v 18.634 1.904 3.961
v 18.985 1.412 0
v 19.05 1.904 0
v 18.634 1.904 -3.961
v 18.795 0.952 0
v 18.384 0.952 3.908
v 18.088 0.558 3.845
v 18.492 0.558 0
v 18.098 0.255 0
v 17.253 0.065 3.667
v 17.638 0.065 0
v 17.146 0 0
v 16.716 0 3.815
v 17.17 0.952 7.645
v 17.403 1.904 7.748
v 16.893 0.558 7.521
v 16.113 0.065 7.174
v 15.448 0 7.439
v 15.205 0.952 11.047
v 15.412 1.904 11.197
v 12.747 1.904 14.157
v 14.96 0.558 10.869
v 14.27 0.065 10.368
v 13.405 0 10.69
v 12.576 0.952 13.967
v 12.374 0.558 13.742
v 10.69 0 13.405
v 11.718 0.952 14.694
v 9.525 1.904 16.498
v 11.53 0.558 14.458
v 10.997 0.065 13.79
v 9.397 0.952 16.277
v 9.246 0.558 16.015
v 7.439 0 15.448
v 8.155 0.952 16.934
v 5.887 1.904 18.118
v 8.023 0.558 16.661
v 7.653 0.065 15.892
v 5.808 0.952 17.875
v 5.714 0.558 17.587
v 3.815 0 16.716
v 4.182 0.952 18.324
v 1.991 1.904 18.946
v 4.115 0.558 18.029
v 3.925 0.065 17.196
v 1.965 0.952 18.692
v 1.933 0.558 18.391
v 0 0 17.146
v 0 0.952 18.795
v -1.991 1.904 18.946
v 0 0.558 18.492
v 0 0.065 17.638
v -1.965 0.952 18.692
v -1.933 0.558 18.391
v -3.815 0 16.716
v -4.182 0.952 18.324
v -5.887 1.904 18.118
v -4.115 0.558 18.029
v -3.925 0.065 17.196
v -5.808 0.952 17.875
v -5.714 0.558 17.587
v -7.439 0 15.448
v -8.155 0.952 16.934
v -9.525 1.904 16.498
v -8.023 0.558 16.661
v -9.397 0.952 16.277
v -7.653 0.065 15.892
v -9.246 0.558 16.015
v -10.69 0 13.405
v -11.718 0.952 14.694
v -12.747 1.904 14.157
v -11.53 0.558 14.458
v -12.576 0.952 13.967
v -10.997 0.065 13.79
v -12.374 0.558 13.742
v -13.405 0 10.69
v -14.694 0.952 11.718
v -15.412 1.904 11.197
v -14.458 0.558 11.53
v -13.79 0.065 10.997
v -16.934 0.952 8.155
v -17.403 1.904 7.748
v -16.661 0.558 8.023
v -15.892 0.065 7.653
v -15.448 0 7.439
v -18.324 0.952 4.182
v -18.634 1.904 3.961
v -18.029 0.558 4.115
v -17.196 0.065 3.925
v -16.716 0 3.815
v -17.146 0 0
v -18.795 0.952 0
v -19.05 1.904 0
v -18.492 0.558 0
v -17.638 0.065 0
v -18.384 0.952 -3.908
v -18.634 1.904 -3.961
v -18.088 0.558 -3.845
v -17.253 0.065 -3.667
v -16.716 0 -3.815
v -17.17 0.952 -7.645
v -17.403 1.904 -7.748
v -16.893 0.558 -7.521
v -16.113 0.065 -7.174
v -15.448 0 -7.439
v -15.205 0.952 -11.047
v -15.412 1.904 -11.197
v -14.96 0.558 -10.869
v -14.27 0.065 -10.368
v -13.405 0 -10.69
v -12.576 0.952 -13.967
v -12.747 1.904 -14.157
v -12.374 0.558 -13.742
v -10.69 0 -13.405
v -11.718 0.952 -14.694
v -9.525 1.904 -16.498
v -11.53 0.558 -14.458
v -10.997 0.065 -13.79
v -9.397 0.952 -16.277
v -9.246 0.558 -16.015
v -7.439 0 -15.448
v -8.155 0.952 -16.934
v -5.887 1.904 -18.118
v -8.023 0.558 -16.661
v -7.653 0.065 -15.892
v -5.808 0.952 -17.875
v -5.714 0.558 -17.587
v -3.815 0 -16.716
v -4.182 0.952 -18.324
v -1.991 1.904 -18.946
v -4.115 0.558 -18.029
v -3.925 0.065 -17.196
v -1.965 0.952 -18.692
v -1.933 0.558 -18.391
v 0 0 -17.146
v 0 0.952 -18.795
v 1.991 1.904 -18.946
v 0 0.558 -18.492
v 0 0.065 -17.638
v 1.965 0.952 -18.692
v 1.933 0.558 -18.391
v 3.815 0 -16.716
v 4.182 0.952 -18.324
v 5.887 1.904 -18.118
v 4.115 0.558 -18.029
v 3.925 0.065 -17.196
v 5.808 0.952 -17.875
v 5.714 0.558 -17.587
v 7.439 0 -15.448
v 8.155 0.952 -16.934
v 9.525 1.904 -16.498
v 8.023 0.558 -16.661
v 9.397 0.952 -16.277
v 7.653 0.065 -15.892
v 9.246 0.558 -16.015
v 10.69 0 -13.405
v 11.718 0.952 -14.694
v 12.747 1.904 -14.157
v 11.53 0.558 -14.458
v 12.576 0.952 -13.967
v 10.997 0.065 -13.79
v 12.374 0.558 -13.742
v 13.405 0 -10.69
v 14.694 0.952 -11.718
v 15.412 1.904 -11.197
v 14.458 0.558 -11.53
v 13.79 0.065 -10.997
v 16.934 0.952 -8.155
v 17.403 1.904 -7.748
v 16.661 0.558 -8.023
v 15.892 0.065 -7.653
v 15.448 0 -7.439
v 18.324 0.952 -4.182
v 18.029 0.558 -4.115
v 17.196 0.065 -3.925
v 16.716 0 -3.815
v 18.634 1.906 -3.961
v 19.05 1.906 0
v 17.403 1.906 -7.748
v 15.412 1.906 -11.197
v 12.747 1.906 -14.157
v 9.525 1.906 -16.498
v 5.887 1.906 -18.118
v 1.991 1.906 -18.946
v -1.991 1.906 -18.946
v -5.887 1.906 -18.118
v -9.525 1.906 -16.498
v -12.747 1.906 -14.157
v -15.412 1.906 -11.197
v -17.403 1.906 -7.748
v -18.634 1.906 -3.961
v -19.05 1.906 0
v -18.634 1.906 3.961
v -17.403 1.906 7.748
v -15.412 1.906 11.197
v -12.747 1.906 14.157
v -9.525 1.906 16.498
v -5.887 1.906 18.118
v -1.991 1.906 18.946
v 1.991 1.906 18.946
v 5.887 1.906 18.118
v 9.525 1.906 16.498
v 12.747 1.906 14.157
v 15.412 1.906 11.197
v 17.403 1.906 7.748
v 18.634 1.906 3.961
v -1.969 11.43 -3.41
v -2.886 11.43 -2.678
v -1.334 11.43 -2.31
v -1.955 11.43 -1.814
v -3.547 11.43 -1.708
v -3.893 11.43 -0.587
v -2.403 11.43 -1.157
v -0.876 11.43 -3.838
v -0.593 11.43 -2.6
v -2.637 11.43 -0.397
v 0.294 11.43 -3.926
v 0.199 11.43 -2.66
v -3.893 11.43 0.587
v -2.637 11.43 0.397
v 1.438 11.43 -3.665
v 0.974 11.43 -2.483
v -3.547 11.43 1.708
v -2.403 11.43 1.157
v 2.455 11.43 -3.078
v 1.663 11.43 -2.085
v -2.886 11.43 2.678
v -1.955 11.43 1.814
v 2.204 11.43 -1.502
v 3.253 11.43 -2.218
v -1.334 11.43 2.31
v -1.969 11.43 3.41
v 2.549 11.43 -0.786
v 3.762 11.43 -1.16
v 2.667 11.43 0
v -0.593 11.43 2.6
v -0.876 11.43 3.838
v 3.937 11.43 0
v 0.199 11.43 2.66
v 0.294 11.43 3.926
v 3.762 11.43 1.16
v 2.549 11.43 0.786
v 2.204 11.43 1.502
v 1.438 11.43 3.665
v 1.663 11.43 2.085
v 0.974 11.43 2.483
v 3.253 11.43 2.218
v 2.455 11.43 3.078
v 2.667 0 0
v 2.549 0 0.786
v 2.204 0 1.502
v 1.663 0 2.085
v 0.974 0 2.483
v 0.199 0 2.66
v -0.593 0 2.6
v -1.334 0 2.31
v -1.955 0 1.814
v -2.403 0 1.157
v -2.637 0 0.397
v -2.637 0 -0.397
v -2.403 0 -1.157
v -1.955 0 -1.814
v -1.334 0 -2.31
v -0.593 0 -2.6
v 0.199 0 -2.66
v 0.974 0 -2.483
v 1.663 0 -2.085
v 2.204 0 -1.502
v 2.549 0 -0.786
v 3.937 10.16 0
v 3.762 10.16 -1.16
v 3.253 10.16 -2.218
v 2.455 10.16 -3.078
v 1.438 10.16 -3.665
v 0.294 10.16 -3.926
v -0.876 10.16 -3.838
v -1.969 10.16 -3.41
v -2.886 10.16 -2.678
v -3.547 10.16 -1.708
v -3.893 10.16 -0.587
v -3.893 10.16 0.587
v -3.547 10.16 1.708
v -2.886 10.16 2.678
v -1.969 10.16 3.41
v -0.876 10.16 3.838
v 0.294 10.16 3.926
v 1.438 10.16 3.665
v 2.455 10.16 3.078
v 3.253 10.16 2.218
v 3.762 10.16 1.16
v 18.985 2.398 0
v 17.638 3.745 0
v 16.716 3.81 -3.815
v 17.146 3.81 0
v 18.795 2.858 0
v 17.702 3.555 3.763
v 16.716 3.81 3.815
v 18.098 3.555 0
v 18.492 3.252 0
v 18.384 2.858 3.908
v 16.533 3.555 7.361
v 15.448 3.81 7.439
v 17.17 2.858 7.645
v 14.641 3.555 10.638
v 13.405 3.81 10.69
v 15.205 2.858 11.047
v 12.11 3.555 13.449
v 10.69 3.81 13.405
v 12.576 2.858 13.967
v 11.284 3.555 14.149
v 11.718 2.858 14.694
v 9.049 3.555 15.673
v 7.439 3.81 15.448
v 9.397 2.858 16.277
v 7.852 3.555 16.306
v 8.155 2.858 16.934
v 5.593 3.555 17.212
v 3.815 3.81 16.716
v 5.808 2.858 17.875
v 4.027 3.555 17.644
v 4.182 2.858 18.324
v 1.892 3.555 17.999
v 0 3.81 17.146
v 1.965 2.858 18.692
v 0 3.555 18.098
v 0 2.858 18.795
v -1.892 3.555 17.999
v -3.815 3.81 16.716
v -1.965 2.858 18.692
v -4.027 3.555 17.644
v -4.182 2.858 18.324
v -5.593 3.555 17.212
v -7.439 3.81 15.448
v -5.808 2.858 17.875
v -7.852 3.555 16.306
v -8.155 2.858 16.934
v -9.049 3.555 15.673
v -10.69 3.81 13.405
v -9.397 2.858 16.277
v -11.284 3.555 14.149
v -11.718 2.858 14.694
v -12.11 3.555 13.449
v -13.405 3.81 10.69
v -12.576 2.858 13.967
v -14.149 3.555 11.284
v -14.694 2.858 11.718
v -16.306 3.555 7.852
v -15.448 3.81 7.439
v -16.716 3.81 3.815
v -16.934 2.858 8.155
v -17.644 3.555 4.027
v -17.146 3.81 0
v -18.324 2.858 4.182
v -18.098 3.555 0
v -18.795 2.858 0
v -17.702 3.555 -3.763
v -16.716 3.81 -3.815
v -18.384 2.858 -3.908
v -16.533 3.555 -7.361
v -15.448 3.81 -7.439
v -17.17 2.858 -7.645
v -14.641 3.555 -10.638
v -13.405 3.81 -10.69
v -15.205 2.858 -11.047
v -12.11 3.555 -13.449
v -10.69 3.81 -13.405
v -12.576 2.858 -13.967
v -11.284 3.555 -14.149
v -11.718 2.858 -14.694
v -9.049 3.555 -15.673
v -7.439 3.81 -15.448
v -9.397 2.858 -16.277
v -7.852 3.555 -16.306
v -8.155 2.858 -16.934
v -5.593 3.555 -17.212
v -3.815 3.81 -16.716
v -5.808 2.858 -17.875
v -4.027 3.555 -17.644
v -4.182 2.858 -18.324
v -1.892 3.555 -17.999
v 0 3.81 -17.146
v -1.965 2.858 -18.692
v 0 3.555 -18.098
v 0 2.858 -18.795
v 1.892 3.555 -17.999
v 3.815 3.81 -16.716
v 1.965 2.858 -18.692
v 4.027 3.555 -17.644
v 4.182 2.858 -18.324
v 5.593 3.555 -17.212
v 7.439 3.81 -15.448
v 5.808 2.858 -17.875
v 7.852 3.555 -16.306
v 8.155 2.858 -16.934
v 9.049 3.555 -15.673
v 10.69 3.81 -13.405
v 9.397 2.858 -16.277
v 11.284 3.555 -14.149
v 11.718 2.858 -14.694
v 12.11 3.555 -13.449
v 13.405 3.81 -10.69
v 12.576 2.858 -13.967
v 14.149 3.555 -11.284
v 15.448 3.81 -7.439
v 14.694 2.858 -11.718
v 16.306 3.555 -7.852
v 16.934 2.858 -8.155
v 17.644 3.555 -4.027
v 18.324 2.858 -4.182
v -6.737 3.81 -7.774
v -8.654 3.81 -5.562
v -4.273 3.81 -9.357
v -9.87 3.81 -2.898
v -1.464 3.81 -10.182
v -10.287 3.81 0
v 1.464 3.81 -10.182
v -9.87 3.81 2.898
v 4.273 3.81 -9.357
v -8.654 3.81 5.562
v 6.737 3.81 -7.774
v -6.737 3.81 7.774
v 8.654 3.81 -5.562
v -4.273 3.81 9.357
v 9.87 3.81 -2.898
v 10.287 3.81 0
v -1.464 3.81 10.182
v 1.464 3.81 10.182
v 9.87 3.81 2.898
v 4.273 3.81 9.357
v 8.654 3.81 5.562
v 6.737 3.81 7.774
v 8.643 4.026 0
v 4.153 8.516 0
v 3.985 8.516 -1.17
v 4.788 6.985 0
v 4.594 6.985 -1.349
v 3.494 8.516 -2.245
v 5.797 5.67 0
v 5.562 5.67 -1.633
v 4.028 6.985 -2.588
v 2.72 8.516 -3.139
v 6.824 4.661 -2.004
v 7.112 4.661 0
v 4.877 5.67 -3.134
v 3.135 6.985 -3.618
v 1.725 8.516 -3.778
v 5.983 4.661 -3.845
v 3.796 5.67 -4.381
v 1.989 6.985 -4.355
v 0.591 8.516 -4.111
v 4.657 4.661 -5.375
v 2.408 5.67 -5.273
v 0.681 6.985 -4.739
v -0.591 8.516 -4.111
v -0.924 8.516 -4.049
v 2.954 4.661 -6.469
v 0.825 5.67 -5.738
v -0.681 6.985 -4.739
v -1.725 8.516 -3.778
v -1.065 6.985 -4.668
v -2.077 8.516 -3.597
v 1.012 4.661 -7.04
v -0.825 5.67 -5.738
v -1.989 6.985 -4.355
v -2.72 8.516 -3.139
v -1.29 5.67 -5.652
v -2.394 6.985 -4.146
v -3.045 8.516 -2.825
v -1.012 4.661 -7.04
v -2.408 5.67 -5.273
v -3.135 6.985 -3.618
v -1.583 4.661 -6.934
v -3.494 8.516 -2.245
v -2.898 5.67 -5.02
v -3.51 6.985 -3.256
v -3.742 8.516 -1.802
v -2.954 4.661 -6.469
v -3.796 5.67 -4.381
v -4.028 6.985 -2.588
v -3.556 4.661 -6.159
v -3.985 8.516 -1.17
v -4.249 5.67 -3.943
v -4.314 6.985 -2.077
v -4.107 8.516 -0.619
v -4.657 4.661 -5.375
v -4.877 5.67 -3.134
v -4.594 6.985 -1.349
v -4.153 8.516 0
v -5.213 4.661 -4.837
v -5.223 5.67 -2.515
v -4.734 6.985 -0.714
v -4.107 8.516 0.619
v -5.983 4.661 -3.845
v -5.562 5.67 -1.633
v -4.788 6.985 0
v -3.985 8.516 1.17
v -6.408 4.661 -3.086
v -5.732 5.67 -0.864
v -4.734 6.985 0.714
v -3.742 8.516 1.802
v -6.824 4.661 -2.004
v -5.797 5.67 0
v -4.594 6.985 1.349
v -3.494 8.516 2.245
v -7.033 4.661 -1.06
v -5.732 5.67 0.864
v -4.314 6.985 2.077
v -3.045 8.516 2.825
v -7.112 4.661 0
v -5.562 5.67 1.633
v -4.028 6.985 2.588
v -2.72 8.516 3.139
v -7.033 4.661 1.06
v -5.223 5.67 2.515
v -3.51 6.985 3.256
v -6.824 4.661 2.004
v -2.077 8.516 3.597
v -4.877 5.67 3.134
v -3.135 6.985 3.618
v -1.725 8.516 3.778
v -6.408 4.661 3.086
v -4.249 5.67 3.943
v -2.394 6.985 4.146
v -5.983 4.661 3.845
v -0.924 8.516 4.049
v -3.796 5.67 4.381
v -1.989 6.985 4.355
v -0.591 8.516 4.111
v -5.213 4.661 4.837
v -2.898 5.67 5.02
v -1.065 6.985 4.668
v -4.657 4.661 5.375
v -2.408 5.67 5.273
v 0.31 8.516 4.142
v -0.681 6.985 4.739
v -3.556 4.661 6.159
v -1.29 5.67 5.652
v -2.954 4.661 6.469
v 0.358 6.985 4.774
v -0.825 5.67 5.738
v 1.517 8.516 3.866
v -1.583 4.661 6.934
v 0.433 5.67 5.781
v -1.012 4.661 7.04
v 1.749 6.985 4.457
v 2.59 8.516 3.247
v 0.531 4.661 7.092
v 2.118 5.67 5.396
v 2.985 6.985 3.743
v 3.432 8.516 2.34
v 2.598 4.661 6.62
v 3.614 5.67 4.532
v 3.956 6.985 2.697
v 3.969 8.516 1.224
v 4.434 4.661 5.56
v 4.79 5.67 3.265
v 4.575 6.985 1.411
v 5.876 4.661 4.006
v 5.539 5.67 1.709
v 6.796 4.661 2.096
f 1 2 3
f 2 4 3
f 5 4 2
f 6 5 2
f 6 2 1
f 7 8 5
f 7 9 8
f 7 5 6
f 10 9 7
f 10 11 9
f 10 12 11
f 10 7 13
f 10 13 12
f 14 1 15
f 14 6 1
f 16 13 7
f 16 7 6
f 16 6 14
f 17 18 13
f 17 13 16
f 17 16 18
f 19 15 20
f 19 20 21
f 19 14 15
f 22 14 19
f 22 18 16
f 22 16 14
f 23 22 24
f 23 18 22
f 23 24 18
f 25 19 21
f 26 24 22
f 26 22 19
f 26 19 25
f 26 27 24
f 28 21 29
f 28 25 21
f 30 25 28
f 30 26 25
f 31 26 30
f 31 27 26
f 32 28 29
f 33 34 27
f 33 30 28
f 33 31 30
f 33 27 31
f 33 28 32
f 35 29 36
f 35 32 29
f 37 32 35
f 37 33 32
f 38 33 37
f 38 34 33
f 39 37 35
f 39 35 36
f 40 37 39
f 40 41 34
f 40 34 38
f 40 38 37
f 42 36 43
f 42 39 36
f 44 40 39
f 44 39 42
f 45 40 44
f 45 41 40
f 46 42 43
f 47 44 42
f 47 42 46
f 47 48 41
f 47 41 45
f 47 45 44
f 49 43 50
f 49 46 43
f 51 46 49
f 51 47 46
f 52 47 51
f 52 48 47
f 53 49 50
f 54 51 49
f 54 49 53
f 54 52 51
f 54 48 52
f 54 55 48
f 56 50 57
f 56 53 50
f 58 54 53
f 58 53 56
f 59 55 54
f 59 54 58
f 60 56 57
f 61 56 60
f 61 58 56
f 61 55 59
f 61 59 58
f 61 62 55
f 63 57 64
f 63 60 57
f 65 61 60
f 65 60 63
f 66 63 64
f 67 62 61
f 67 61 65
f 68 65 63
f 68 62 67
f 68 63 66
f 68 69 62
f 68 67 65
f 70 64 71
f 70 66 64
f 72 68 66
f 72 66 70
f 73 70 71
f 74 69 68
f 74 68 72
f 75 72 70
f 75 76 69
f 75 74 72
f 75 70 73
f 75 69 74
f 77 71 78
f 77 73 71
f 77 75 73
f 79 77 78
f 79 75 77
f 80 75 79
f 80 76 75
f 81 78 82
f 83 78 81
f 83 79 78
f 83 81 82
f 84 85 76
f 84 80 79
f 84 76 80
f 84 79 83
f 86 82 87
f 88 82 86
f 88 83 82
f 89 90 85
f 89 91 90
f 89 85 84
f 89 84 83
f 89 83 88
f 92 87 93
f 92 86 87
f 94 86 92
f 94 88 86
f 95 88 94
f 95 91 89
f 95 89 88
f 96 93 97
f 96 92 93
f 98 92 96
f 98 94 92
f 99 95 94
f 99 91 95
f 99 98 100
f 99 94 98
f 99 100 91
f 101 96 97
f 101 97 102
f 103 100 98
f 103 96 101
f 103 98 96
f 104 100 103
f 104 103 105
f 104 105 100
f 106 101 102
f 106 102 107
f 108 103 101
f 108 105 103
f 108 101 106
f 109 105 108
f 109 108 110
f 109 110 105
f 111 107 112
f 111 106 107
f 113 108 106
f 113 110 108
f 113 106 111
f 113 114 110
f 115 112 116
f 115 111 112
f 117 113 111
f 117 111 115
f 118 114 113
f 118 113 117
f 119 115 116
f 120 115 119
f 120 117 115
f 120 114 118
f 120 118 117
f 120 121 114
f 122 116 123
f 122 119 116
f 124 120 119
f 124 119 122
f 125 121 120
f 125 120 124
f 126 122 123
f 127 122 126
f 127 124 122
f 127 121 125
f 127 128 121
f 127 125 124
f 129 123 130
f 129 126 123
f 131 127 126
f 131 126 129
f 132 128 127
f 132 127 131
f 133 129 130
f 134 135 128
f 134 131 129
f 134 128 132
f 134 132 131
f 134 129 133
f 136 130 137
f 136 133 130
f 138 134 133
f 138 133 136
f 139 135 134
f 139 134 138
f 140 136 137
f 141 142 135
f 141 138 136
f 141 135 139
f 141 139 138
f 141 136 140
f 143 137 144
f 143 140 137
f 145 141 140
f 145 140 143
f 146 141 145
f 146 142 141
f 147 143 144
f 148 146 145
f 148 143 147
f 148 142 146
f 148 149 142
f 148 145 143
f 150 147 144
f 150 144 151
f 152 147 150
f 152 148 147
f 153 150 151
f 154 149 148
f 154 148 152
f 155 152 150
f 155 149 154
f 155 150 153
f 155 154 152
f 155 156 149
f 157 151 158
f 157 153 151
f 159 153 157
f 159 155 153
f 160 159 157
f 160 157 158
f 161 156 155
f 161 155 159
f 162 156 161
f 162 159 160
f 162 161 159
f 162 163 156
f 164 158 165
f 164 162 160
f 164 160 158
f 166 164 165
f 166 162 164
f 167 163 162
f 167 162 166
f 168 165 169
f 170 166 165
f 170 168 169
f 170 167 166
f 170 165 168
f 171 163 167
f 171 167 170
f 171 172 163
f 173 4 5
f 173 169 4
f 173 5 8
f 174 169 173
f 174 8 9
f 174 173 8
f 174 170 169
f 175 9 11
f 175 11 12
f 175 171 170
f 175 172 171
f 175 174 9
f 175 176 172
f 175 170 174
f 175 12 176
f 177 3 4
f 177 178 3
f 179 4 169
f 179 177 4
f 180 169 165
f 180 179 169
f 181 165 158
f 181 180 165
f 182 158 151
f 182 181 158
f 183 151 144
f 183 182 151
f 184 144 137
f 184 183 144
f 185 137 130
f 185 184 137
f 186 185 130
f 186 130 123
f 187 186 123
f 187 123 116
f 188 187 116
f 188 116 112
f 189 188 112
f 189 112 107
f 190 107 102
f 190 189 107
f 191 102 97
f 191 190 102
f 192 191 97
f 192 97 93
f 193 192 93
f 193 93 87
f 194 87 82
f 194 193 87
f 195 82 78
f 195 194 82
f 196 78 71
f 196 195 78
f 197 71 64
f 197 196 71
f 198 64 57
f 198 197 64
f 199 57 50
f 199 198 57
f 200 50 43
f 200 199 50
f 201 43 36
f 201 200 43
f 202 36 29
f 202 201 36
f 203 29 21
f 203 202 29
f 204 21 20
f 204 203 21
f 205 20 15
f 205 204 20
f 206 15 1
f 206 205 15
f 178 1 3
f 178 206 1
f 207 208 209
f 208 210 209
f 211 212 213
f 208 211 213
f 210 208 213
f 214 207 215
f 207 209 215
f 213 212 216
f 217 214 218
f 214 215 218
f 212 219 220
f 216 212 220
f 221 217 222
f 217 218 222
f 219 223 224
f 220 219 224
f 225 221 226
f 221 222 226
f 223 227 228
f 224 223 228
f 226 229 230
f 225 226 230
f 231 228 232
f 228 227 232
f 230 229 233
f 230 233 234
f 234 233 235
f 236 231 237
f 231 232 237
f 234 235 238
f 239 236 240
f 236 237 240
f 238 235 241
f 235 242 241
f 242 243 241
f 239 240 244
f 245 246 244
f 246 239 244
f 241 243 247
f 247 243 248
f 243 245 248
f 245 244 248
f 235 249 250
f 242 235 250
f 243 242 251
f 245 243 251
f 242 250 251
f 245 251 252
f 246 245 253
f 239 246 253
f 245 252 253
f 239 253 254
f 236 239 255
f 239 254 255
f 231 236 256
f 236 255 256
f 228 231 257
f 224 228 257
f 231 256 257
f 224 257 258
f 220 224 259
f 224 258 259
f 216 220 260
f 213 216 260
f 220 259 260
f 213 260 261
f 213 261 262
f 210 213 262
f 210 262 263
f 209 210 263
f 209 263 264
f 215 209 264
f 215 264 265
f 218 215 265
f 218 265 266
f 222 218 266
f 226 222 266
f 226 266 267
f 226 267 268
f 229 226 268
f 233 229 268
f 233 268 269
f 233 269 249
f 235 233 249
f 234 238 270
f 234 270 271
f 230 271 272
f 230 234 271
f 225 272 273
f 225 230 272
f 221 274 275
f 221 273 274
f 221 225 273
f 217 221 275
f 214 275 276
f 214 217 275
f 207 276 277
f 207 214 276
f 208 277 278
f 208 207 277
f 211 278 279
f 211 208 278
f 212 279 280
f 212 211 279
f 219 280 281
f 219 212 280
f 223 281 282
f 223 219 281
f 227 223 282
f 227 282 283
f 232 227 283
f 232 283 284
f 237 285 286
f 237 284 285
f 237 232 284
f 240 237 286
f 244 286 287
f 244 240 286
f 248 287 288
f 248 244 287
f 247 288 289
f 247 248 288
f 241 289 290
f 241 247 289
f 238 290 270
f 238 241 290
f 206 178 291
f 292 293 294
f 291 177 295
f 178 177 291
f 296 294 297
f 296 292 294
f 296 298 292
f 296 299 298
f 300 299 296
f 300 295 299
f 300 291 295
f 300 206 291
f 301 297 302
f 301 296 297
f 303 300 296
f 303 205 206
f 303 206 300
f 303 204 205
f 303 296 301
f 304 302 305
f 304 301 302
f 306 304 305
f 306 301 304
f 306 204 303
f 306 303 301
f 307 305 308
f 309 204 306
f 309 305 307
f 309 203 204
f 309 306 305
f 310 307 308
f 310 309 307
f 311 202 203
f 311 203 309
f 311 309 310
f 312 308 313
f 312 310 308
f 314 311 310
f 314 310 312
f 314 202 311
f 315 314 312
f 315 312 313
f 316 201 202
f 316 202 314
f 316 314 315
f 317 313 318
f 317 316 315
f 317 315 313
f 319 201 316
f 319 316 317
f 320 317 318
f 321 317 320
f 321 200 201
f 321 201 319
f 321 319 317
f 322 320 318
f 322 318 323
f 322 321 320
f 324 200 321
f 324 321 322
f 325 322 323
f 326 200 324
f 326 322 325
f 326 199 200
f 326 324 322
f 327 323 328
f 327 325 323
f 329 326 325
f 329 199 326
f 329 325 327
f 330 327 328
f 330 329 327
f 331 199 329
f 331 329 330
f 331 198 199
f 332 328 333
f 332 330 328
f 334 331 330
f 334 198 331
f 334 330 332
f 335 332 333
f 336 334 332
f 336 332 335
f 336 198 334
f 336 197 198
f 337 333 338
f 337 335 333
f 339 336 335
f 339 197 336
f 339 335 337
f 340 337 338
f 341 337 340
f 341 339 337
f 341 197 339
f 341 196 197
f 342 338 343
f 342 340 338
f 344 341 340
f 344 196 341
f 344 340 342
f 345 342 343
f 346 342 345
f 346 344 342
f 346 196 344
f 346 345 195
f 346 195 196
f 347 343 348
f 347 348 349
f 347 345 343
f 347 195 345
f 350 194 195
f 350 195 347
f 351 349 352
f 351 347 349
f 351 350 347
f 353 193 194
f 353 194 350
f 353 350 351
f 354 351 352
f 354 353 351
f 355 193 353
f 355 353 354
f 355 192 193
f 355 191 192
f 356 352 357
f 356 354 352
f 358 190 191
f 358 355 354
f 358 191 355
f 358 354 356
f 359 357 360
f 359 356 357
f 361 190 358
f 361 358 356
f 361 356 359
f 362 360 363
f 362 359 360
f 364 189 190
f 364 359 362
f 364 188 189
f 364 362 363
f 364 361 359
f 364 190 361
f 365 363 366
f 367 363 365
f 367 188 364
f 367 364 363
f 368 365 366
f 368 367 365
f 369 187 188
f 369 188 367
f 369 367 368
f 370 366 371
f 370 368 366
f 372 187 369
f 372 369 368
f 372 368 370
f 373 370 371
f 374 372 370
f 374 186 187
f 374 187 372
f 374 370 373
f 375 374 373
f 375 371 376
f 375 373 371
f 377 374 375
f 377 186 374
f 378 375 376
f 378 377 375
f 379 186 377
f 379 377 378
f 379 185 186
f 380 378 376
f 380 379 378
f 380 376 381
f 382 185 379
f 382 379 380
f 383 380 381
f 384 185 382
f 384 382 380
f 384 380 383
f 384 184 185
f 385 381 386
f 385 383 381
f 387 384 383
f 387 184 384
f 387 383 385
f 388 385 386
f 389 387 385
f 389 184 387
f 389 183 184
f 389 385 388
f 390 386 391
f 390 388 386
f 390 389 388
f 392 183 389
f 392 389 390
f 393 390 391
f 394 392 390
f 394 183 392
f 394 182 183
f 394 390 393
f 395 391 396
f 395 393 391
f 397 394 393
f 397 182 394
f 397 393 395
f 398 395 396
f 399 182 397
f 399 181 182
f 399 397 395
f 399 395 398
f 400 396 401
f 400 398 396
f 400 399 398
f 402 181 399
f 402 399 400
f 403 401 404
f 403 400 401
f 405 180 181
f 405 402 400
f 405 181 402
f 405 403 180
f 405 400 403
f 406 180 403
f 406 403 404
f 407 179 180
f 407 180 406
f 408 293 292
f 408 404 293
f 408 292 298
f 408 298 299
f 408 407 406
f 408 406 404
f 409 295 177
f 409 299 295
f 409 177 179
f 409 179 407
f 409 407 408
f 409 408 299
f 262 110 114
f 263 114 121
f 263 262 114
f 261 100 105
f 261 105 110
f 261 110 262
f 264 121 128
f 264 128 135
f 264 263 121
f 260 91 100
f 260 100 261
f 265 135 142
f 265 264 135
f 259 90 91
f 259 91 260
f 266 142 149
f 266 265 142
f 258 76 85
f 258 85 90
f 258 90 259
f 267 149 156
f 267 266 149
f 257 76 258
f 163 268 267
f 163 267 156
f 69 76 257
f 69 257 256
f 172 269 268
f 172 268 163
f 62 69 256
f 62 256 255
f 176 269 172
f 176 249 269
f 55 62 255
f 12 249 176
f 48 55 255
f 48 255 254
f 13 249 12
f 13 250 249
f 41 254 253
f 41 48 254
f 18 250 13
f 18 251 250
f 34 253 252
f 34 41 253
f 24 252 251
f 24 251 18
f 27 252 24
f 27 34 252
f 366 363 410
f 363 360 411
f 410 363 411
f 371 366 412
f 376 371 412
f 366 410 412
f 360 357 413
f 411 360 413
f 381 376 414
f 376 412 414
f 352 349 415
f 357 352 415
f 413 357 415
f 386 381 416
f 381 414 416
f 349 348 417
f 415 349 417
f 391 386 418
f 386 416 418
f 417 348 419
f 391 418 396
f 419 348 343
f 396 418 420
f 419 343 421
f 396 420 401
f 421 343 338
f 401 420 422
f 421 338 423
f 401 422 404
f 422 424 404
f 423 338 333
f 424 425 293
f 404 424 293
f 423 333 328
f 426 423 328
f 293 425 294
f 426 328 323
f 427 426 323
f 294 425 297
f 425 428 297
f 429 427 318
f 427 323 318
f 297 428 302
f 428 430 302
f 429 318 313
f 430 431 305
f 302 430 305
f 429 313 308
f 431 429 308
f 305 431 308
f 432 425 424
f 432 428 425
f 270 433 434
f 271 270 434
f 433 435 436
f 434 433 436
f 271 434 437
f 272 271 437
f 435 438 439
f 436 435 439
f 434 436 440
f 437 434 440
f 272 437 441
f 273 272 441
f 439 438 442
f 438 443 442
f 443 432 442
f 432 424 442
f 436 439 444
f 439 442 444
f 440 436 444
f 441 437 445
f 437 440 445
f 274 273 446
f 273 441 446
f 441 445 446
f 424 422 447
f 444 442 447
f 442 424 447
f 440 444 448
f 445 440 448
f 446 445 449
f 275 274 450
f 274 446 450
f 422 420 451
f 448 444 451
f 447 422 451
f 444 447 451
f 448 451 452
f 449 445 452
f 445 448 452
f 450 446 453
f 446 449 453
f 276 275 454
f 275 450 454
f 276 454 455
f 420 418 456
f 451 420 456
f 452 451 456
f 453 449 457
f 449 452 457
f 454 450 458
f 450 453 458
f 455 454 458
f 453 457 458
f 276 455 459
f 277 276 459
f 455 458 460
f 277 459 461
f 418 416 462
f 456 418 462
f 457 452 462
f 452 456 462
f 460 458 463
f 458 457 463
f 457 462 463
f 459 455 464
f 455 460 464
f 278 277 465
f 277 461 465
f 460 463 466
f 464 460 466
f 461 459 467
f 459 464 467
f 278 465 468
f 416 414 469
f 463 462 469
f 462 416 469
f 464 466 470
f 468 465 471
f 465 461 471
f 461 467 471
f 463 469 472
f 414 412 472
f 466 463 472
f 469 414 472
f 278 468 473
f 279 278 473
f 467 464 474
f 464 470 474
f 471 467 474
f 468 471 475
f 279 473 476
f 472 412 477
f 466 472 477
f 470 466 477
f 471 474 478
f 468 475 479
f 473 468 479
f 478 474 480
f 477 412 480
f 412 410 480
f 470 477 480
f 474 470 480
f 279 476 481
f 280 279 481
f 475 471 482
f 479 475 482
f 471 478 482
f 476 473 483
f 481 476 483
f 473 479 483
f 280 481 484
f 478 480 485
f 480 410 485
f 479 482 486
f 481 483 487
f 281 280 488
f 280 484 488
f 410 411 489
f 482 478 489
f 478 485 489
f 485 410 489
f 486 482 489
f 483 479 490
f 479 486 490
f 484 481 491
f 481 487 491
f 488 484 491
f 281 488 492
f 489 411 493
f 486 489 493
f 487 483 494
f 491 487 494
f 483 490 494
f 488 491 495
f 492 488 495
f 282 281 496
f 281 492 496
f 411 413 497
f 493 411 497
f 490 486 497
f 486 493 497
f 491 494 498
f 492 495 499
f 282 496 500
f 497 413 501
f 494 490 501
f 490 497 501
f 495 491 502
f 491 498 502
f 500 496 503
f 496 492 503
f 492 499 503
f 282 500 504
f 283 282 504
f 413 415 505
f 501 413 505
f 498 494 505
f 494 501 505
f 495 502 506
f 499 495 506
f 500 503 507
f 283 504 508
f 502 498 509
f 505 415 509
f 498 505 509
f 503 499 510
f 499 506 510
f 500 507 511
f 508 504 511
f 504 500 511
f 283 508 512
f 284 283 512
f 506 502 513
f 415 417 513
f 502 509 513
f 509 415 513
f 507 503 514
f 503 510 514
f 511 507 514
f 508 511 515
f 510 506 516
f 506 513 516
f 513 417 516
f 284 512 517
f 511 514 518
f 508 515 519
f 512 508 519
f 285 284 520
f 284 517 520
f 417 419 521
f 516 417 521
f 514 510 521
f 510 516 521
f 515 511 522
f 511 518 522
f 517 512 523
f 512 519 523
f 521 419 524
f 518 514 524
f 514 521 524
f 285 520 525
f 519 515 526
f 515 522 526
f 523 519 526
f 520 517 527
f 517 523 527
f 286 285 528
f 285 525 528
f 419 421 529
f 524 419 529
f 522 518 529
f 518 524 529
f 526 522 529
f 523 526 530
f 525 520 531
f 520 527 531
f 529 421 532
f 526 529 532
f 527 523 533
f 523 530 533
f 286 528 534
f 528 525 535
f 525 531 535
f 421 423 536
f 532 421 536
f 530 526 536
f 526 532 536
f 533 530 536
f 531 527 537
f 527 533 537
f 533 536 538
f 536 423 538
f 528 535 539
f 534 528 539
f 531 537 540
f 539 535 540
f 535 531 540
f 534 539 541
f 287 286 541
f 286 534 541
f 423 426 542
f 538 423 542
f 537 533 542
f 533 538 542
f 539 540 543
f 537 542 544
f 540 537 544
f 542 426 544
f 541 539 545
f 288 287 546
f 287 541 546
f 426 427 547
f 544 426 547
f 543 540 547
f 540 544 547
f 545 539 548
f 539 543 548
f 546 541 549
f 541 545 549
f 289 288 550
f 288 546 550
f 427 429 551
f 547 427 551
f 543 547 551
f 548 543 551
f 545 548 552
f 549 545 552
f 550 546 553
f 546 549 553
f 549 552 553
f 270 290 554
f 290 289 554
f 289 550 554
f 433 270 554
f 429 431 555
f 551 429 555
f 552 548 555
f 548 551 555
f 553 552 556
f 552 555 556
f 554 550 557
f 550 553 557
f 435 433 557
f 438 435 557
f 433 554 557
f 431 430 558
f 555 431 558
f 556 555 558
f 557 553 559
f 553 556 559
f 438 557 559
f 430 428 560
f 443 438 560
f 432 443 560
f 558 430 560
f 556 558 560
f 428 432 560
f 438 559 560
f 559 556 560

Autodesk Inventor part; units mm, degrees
ref_plane "YZ Plane" through (0, 0, 0) normal (1, 0, 0) x (0, 1, 0)
ref_plane "XZ Plane" through (0, 0, 0) normal (0, 1, 0) x (-1, 0, 0)
ref_plane "XY Plane" through (0, 0, 0) normal (0, 0, 1) x (1, 0, 0)
sketch "Sketch1" plane through (0, 0, 0) normal (0, 0, 1) x (1, 0, 0)
  line L0 (2.667, 0) -> (19.05, 0)
  line L1 (19.05, 0) -> (19.05, 3.81)
  line L2 (19.05, 3.81) -> (3.937, 3.81)
  line L3 (3.937, 3.81) -> (3.937, 11.43)
  line L4 (3.937, 11.43) -> (2.667, 11.43)
  line L5 (2.667, 11.43) -> (2.667, 0)
  line L6 (0, 25.5419) -> (0, -2.7317)
  point P0 (0, 0)
  dimension "d11" = 19.05
  dimension "d12" = 3.81
  dimension "d13" = 1.27
  dimension "d15" = 2.667
  dimension "d16" = 7.62
revolve "Revolution1" add sketch "Sketch1" angle 360 about axis through (0, 25.5419, 0) along (0, -1, 0)
fillet "Fillet1" radius 6.35 1 edges at (-3.937, 3.81, 0)
fillet "Fillet2" radius 1.905 2 edges at (-19.05, 3.81, 0) (-19.05, 0, 0)
properties part number "Front Wheel"
